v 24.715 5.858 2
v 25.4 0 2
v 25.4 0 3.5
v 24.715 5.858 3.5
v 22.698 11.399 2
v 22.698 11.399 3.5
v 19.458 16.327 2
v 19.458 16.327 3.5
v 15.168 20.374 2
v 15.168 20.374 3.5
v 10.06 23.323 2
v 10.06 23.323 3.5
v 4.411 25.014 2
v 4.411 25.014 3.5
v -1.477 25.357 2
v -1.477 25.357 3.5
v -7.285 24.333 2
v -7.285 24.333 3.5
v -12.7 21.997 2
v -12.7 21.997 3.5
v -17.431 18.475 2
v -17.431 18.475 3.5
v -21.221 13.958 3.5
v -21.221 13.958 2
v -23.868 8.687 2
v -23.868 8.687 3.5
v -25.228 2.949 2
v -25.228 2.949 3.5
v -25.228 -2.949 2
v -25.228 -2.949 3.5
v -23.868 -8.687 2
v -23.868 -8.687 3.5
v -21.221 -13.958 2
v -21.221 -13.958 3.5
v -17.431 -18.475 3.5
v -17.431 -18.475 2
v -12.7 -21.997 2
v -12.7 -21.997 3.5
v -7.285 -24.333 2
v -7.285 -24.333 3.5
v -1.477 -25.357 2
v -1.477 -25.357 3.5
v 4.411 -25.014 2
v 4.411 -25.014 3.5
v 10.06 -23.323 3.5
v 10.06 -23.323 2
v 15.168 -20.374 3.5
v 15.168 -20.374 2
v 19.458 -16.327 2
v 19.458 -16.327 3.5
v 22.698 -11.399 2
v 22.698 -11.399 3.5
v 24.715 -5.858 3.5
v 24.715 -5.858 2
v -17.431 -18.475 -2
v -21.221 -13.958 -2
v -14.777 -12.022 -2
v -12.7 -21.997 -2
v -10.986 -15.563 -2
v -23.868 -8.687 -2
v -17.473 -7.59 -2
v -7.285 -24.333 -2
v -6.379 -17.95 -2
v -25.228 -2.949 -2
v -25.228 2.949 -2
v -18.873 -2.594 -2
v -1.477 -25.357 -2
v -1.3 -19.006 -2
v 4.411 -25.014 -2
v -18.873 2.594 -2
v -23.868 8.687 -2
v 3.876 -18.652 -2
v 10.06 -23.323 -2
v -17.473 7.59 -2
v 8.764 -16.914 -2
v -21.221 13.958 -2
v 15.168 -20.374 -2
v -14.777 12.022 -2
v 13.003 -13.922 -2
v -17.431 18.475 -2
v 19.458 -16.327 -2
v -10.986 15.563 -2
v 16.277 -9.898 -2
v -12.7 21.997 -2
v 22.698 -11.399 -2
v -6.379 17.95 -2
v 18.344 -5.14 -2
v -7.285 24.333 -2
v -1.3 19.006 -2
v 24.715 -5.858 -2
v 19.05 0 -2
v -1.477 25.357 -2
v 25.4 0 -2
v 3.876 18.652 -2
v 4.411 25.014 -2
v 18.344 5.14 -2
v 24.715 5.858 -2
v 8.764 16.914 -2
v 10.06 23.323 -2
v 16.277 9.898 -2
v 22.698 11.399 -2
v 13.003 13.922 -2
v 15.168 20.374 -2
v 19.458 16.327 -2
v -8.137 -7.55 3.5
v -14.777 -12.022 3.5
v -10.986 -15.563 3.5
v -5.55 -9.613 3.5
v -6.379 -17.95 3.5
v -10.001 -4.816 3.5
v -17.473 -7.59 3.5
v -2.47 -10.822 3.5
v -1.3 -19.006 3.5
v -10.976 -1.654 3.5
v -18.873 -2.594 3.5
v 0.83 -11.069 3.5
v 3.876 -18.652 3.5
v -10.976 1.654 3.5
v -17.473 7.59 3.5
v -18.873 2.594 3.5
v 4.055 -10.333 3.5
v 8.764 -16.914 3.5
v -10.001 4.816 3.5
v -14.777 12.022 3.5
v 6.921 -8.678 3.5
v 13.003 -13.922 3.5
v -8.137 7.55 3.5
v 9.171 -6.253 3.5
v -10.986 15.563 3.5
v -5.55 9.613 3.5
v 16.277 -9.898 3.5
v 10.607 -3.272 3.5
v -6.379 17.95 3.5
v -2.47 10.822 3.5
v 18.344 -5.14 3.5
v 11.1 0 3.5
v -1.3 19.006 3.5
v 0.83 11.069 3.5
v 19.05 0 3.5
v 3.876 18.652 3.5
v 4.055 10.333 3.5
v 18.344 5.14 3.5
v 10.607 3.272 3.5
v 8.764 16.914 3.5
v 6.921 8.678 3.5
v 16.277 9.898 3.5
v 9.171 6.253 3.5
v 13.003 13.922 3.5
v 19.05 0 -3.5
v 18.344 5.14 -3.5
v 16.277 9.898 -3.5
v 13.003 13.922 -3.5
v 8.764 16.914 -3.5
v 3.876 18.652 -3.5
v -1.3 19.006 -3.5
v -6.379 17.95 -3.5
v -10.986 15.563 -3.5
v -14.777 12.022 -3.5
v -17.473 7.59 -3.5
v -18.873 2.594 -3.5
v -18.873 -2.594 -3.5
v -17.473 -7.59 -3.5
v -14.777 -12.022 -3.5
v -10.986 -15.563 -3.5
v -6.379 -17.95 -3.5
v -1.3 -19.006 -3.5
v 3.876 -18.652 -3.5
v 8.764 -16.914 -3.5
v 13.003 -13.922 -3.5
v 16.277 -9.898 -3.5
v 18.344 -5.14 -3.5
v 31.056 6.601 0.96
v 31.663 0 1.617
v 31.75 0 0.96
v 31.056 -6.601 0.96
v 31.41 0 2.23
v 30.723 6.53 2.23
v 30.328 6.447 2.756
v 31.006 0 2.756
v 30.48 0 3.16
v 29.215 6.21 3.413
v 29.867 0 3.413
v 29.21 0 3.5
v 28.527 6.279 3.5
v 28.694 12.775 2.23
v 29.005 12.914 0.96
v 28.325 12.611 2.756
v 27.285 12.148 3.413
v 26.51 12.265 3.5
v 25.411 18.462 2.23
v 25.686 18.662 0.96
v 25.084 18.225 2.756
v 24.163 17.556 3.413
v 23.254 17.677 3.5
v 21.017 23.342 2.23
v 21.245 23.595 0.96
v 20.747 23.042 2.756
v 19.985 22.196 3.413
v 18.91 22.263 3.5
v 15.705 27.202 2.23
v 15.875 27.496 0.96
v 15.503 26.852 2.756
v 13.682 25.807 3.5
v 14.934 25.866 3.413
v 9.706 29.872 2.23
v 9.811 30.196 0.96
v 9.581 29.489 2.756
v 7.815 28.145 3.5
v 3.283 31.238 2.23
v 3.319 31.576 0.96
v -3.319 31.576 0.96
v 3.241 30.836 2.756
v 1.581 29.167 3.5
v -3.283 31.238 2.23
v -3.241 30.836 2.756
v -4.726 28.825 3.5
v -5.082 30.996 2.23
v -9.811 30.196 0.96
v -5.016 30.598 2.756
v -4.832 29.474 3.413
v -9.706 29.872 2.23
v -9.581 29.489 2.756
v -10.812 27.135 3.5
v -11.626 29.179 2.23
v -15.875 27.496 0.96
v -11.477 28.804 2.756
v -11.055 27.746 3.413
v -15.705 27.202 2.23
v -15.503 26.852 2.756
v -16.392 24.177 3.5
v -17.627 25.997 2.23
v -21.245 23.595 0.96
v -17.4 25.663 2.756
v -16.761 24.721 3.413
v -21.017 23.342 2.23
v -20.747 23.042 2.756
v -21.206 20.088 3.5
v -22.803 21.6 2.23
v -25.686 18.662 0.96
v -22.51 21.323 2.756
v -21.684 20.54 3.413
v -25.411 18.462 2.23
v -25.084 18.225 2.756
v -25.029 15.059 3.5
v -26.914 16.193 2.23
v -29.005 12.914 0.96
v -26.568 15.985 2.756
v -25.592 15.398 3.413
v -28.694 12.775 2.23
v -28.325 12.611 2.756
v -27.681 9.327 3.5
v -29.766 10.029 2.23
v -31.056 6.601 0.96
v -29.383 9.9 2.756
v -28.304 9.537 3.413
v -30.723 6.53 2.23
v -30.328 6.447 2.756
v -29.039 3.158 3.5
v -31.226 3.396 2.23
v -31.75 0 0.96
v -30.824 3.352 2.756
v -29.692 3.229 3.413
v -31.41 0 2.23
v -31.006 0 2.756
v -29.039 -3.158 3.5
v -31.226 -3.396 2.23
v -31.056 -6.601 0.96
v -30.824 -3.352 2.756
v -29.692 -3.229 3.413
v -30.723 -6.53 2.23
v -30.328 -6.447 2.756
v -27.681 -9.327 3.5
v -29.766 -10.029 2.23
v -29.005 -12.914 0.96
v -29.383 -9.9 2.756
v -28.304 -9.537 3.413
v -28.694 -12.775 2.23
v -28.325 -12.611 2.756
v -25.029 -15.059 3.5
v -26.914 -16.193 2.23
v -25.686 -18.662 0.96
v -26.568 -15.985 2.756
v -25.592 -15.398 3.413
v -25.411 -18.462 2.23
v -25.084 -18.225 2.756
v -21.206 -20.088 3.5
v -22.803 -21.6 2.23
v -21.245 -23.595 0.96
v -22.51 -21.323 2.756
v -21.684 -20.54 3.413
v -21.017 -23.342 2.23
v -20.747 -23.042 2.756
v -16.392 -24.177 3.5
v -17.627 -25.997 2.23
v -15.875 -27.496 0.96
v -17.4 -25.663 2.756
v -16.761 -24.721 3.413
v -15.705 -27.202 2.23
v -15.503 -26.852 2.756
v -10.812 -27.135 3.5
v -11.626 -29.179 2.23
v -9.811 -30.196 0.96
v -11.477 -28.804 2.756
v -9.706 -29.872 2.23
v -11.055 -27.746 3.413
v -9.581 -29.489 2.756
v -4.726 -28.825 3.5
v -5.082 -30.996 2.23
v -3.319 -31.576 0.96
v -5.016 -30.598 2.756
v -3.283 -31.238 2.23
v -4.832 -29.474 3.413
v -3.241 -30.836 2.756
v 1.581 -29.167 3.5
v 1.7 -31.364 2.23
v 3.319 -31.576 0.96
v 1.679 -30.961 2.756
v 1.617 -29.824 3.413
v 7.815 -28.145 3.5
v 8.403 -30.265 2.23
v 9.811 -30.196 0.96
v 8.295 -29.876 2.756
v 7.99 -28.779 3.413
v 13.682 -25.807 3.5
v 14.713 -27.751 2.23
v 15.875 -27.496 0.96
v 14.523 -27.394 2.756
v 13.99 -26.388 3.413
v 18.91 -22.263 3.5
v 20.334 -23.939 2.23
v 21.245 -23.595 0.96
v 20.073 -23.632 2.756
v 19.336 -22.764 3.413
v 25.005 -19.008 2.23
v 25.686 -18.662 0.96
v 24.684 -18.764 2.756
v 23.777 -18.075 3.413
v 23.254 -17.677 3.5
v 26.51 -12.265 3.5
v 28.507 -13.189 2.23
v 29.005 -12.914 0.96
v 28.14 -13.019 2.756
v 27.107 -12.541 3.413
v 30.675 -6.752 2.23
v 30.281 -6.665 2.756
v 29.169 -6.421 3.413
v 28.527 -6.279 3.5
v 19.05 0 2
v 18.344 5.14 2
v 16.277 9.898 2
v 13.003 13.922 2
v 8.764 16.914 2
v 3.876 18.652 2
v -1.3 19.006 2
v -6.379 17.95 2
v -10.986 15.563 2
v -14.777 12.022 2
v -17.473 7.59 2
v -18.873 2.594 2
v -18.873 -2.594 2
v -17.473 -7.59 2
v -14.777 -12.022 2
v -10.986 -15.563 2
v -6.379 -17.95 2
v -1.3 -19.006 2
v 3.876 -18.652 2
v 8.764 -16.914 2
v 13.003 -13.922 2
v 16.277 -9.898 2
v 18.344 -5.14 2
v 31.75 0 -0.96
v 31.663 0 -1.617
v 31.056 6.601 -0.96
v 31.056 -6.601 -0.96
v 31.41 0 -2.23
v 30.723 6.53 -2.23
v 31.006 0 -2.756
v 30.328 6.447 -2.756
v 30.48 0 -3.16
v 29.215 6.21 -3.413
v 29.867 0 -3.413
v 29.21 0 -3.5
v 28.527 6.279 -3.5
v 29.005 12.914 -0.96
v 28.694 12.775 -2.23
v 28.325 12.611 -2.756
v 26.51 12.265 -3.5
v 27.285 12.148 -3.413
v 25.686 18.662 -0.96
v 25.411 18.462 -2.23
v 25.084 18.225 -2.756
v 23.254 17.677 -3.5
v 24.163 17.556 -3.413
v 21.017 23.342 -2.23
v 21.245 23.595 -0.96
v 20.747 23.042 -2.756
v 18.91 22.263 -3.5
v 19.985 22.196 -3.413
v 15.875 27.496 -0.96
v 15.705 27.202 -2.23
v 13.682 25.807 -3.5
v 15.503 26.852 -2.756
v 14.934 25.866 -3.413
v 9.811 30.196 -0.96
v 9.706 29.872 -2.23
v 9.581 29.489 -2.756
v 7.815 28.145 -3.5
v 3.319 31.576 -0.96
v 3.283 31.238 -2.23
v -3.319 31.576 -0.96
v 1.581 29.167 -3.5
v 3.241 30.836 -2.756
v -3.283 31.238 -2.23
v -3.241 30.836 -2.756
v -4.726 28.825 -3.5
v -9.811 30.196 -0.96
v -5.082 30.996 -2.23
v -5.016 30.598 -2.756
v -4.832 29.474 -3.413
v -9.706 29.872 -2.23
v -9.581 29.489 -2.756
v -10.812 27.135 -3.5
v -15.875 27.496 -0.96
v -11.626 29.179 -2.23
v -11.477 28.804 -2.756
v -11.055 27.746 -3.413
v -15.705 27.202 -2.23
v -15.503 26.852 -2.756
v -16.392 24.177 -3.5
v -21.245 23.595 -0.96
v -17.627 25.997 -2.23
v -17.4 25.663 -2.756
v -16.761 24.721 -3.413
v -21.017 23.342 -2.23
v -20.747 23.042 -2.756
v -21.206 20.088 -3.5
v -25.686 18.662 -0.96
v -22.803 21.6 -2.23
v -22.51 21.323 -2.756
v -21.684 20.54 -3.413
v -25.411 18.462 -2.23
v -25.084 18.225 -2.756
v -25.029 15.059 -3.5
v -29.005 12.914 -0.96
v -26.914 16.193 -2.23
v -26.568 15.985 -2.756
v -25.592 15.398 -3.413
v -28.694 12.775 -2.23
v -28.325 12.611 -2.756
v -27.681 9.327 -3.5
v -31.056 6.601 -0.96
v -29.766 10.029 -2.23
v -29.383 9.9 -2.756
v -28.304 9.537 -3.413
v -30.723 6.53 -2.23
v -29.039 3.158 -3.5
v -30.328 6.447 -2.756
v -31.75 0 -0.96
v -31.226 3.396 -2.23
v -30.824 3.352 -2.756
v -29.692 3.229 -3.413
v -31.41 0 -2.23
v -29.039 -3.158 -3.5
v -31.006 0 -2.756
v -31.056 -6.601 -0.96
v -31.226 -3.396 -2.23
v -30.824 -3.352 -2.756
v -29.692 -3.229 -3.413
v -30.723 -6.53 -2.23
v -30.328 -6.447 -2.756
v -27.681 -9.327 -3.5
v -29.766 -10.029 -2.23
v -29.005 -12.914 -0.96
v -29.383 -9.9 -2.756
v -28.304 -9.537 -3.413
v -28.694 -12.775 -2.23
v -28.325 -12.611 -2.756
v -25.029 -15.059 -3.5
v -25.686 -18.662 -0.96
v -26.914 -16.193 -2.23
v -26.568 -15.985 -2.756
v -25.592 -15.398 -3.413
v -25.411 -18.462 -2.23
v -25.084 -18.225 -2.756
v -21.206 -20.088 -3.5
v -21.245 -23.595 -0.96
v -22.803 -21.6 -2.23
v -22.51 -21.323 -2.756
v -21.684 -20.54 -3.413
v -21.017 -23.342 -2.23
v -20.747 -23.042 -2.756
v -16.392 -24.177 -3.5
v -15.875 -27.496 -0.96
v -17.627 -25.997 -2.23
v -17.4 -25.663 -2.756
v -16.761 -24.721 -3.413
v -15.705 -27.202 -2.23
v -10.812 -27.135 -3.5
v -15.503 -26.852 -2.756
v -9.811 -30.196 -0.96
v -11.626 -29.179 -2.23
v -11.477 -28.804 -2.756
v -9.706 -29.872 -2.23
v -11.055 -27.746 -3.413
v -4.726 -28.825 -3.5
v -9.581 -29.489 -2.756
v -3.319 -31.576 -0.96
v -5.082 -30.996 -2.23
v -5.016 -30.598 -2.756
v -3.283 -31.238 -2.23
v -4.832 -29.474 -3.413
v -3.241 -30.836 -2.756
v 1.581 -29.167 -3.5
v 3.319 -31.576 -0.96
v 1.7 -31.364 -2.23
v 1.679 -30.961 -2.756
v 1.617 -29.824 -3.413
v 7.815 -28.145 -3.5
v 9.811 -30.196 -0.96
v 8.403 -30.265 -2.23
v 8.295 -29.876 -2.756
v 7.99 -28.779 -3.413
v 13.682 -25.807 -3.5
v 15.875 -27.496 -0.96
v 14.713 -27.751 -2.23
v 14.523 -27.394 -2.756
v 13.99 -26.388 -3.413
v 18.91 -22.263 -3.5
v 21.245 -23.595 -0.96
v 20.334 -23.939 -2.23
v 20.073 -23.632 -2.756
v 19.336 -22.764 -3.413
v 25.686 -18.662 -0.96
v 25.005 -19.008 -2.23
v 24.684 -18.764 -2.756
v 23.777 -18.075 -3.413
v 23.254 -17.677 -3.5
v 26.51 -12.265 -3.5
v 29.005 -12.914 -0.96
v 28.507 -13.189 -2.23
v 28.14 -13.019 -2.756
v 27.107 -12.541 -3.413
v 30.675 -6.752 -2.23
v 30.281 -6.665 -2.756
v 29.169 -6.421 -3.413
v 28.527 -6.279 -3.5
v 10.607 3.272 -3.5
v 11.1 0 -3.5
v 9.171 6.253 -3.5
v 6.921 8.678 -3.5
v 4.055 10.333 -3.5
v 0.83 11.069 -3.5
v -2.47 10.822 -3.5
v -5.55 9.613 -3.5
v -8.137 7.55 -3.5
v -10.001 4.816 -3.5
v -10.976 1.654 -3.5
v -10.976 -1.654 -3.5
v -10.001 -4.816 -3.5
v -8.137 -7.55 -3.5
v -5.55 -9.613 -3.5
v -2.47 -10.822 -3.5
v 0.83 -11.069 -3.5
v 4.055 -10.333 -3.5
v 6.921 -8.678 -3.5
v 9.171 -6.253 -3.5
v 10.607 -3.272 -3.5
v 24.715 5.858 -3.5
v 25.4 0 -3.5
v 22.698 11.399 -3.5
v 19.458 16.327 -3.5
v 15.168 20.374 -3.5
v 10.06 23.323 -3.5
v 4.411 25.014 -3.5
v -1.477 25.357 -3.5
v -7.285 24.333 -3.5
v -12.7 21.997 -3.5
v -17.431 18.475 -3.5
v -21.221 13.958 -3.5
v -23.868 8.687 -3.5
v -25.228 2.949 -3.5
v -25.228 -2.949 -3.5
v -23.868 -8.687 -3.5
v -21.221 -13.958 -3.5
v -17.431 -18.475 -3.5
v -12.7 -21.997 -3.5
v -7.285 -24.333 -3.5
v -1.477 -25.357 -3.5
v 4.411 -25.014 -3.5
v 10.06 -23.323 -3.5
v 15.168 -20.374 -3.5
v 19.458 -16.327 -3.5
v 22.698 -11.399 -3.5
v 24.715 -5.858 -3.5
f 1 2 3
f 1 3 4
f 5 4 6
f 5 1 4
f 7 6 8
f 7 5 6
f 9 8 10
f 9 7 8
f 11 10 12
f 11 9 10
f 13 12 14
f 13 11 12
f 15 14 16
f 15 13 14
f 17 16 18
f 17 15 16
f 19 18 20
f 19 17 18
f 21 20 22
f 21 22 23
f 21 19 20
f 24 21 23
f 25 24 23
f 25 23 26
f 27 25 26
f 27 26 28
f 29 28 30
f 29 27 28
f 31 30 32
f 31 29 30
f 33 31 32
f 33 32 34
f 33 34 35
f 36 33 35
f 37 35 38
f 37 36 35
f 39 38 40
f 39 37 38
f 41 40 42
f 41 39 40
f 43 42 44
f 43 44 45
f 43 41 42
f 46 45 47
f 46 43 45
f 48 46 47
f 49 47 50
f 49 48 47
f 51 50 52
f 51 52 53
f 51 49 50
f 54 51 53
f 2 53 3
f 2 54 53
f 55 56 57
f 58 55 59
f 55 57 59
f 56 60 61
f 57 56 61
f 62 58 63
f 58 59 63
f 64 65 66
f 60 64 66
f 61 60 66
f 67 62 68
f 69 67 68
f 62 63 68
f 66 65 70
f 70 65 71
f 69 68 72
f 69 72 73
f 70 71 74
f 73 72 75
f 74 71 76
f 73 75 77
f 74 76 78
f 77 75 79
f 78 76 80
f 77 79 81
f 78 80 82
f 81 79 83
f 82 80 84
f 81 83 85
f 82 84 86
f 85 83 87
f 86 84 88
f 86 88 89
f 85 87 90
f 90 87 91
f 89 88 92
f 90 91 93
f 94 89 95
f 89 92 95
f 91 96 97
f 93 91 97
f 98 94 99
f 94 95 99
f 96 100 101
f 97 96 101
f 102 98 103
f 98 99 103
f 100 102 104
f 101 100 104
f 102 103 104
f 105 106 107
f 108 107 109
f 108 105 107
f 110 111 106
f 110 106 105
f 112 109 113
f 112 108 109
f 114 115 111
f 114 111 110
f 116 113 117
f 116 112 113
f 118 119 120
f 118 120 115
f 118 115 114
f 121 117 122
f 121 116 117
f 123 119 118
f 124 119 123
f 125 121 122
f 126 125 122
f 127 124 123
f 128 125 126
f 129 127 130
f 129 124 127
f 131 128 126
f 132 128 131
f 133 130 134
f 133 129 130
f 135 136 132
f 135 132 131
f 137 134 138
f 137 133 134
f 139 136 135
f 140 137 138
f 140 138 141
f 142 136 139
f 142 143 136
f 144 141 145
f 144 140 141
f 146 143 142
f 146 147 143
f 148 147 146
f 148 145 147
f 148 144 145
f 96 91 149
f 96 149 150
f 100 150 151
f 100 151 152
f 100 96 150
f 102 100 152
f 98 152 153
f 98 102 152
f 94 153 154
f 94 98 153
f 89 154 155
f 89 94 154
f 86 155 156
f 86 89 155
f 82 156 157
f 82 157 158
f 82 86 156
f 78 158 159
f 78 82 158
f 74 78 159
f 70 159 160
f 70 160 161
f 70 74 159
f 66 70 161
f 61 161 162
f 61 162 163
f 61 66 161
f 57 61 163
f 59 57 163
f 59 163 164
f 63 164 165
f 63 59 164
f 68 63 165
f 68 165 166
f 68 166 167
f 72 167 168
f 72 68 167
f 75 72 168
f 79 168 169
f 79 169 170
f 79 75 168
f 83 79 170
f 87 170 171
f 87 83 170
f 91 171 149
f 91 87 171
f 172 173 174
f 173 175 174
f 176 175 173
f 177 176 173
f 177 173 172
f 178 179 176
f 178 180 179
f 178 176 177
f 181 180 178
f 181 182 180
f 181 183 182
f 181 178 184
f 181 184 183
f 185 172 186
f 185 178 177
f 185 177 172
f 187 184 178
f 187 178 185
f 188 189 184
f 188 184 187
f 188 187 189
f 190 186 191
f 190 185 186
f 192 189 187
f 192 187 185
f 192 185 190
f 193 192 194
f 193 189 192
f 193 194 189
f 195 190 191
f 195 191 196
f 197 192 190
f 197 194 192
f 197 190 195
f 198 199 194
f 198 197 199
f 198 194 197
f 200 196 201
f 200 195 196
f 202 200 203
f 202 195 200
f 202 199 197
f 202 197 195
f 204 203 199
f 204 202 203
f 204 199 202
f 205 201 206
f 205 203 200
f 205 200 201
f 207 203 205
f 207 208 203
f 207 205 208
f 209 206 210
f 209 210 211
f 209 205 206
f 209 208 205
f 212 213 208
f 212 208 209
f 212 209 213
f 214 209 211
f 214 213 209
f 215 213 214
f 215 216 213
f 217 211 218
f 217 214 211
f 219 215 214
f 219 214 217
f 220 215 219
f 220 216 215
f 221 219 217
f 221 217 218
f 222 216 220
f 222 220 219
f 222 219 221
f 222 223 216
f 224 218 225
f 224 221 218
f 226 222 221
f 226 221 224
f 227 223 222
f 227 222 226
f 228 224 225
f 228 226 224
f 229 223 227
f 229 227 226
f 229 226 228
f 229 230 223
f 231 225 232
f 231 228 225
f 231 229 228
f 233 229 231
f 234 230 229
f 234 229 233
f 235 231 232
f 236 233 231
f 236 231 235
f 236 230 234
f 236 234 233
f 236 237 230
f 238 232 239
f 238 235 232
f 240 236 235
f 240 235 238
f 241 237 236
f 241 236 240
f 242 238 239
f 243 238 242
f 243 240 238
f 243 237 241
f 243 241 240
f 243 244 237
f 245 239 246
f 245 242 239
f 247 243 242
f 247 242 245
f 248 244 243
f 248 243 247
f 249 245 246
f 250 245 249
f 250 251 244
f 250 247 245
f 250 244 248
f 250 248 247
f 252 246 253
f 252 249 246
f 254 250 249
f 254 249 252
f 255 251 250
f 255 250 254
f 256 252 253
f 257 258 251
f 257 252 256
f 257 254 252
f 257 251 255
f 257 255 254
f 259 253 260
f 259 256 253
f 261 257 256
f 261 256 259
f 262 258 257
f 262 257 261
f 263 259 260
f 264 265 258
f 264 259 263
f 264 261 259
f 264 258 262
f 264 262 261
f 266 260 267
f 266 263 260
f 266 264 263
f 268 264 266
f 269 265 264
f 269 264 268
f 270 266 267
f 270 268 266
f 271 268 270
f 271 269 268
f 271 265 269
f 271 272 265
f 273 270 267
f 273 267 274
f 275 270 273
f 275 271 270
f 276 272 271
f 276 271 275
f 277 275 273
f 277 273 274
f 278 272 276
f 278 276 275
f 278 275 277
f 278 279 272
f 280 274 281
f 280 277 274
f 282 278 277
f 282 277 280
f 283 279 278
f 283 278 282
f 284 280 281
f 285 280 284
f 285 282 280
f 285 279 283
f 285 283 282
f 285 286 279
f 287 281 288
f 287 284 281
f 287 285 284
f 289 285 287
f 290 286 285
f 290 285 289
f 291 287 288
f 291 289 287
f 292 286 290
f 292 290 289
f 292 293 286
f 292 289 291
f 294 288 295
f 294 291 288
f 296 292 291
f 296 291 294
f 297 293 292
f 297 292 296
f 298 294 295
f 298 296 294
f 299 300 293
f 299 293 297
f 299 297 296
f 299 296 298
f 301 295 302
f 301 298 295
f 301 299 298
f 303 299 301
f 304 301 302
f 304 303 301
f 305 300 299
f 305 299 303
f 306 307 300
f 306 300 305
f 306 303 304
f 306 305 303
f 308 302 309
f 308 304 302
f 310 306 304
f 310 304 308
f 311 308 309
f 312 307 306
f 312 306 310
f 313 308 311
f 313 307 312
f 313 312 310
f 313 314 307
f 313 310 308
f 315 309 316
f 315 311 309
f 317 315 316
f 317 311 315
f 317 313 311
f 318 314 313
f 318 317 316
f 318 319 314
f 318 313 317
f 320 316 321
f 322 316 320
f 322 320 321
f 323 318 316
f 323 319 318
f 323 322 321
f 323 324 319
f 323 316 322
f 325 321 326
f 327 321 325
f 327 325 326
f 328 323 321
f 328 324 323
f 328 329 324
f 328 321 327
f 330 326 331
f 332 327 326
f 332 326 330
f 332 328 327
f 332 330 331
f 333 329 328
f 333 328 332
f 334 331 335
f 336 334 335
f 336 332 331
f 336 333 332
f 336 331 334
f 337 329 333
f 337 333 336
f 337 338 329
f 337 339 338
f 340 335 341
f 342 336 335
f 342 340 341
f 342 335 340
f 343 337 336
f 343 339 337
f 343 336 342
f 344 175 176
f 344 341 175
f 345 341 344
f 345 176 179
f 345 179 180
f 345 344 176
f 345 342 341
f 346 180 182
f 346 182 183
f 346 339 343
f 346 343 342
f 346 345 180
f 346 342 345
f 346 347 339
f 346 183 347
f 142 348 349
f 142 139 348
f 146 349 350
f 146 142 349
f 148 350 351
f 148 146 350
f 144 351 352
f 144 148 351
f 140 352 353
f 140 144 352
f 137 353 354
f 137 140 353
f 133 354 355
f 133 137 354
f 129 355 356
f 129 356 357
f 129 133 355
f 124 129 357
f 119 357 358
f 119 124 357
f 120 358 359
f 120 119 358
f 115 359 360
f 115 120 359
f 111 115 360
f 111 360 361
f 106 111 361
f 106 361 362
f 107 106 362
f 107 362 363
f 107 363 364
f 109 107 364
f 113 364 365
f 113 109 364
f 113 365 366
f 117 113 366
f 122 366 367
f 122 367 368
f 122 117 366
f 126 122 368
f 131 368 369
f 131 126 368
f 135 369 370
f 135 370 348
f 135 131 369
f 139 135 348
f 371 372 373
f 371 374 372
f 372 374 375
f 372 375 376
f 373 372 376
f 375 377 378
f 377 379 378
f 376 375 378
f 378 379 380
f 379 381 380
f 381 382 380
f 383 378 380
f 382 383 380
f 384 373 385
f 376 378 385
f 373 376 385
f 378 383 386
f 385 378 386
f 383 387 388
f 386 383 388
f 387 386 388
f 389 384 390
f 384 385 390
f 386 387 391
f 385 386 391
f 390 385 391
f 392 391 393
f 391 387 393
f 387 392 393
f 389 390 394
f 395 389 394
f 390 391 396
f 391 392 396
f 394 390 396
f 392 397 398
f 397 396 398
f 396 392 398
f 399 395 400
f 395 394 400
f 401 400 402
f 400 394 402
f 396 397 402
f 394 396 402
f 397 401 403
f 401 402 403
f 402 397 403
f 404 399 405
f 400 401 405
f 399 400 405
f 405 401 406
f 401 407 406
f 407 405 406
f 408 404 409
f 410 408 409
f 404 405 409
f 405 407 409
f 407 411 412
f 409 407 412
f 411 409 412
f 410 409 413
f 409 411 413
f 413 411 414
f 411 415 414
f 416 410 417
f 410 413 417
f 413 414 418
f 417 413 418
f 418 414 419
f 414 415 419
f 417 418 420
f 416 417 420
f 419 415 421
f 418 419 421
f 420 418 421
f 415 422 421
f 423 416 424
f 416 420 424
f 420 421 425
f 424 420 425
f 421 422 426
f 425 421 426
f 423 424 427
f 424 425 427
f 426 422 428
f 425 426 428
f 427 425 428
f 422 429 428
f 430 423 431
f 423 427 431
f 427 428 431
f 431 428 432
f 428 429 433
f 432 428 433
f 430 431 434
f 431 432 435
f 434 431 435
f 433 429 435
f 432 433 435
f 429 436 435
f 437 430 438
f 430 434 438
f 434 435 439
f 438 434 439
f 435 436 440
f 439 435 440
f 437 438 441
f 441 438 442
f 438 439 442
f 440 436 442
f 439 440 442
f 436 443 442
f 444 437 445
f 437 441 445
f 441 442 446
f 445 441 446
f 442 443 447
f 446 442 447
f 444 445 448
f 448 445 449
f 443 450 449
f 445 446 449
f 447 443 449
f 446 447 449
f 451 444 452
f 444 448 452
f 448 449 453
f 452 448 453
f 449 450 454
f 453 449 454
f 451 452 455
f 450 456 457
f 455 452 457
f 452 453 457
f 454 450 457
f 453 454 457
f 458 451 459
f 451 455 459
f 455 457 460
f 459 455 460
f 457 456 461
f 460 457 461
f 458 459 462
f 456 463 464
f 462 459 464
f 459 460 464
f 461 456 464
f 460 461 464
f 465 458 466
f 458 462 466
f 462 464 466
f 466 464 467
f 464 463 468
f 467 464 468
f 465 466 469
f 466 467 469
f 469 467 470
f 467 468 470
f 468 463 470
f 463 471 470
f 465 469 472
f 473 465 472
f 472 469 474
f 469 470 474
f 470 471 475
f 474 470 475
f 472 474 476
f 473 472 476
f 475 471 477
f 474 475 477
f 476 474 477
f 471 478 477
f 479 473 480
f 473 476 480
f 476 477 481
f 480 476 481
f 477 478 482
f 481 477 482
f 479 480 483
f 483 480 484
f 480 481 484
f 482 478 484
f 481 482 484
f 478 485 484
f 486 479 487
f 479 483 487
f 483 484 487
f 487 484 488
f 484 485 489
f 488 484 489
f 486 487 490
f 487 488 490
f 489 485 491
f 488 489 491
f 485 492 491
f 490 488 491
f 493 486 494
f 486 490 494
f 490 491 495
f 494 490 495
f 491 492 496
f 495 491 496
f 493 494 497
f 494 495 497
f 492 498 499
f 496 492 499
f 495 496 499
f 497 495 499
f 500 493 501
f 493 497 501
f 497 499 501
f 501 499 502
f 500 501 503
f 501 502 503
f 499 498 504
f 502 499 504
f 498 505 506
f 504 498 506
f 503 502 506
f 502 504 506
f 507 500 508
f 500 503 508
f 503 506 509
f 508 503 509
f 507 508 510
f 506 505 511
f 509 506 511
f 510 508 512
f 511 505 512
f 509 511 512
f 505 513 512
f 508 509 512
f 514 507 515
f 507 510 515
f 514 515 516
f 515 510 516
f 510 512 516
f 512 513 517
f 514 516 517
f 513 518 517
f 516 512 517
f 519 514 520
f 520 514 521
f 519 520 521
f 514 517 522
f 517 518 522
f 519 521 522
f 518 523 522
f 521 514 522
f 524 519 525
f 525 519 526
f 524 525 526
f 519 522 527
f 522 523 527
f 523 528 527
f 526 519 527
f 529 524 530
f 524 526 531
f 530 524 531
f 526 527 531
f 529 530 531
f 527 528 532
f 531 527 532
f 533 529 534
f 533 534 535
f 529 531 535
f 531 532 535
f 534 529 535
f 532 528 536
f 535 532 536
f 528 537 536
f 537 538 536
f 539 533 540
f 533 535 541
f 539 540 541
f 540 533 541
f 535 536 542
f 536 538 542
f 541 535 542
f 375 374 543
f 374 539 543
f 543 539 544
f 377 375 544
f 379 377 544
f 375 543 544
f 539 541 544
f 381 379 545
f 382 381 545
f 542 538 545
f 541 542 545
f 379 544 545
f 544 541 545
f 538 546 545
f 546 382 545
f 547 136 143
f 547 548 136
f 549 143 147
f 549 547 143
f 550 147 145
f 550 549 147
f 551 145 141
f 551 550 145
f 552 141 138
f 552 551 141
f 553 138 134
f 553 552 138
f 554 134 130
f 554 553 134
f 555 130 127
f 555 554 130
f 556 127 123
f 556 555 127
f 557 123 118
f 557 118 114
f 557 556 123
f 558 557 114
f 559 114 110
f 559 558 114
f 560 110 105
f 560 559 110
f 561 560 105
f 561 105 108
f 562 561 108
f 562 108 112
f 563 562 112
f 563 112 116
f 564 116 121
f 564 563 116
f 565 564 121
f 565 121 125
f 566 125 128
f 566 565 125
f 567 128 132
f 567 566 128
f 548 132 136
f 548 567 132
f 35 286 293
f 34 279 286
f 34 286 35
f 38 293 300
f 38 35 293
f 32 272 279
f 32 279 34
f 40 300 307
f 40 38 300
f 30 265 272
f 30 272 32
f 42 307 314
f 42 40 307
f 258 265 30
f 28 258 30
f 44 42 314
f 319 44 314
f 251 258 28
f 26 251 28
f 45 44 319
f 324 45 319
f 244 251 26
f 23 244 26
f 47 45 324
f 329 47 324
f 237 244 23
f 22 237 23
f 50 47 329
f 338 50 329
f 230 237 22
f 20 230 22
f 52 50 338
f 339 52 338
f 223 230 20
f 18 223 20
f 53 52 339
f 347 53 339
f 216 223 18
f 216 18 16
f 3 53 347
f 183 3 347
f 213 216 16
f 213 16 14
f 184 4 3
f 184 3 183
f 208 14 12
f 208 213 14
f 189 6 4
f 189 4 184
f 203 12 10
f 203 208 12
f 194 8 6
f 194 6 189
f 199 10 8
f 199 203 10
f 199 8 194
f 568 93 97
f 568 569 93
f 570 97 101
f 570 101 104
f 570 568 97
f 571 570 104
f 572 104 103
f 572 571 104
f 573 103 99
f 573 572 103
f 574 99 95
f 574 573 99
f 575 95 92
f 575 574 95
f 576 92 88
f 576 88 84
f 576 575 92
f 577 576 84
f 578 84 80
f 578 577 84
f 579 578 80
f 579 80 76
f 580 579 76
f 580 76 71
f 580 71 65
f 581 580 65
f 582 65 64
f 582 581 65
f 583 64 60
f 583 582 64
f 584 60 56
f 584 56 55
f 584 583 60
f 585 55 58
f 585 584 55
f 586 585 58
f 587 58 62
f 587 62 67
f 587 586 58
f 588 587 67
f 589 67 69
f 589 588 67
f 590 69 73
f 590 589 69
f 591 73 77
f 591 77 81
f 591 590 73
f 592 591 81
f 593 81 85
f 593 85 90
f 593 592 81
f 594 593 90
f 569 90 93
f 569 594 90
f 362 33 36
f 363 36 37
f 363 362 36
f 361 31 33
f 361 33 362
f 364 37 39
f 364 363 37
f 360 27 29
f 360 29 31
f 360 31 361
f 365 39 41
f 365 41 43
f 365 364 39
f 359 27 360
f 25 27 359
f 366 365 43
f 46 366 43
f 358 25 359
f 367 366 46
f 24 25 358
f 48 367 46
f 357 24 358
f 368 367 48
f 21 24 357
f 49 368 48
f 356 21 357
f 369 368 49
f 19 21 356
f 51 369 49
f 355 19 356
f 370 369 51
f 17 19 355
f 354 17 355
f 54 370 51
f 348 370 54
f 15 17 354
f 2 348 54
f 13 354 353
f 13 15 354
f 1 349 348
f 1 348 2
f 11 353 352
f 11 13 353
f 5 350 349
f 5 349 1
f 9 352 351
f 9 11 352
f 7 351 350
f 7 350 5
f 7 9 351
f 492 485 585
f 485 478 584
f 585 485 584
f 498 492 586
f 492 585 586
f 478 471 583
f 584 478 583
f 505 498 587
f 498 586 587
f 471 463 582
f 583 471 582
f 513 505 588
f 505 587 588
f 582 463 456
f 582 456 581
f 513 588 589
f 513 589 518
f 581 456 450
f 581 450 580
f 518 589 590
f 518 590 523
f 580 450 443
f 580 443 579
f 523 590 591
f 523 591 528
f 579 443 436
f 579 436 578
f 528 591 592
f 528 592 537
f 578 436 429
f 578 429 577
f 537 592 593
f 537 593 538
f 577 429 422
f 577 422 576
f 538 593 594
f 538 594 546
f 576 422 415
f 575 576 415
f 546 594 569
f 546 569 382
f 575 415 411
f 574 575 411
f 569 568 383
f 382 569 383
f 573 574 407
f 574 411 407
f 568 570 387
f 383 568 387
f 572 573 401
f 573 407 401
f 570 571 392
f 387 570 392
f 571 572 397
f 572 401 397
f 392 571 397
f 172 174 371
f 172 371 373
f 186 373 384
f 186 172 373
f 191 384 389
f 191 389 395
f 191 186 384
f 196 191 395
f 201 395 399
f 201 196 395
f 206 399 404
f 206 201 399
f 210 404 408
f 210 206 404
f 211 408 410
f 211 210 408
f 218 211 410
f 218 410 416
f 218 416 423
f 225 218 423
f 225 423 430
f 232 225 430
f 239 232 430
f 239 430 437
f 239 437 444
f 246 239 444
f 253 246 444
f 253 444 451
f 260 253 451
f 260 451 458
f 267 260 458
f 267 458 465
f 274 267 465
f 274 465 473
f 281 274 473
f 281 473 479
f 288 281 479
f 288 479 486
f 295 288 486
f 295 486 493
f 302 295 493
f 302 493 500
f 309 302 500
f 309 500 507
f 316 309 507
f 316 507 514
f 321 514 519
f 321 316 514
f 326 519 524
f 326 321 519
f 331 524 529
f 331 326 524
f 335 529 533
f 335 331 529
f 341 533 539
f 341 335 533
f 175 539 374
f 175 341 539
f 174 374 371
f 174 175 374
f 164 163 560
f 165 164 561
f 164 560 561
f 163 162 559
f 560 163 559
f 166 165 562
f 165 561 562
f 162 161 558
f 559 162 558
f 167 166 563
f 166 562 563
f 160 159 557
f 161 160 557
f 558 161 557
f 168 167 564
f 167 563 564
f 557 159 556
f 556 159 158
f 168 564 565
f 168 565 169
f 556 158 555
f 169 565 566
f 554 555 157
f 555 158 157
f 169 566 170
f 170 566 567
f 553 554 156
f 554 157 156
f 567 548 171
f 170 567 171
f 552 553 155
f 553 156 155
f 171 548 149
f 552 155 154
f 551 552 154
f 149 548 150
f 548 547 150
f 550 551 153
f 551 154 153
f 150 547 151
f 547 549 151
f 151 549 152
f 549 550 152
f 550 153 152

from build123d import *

# Parameters (mm, degrees)
F0_R     = 19.05
F0_R_2   = 11.1
F1_DEPTH = 3.5
F0_R_3   = 31.75
F0_R_4   = 25.4
F2_DEPTH = 2
F3_DEPTH = 0.2
F4_R     = 2.54


with BuildPart() as f1:
    # F0 (on Top) → F1 (new body, symmetric)
    with BuildSketch(Plane.XY):
        Circle(F0_R)
        Circle(F0_R_2, mode=Mode.SUBTRACT)
    extrude(amount=F1_DEPTH, both=True)



with BuildPart() as f1b:
    # F0 (on Top) → F1, piece 2 (new body, symmetric)
    with BuildSketch(Plane.XY):
        Circle(F0_R_3)
        Circle(F0_R_4, mode=Mode.SUBTRACT)
    extrude(amount=F1_DEPTH, both=True)


with BuildPart() as f2:
    # F0 (on Top) → F2 (new body, symmetric)
    with BuildSketch(Plane.XY):
        Circle(F0_R_4)
        Circle(F0_R, mode=Mode.SUBTRACT)
    extrude(amount=F2_DEPTH, both=True)


with BuildPart() as f1_1:
    add(f1.part)

    add(f1b.part)  # F3 merges F1b

    add(f2.part)  # F3 merges F2
    # F0 (on Top) → F3 (join)
    with BuildSketch(Plane.XY):
        Circle(F0_R_4)
        Circle(F0_R, mode=Mode.SUBTRACT)
    extrude(amount=-F3_DEPTH)

    # F4
    f4_edges = [f1_1.edges().sort_by_distance(p)[0] for p in [
        (-31.75, 0, 3.5),
        (-31.75, 0, -3.5),
    ]]
    fillet(f4_edges, radius=F4_R)


solid = f1_1.part
